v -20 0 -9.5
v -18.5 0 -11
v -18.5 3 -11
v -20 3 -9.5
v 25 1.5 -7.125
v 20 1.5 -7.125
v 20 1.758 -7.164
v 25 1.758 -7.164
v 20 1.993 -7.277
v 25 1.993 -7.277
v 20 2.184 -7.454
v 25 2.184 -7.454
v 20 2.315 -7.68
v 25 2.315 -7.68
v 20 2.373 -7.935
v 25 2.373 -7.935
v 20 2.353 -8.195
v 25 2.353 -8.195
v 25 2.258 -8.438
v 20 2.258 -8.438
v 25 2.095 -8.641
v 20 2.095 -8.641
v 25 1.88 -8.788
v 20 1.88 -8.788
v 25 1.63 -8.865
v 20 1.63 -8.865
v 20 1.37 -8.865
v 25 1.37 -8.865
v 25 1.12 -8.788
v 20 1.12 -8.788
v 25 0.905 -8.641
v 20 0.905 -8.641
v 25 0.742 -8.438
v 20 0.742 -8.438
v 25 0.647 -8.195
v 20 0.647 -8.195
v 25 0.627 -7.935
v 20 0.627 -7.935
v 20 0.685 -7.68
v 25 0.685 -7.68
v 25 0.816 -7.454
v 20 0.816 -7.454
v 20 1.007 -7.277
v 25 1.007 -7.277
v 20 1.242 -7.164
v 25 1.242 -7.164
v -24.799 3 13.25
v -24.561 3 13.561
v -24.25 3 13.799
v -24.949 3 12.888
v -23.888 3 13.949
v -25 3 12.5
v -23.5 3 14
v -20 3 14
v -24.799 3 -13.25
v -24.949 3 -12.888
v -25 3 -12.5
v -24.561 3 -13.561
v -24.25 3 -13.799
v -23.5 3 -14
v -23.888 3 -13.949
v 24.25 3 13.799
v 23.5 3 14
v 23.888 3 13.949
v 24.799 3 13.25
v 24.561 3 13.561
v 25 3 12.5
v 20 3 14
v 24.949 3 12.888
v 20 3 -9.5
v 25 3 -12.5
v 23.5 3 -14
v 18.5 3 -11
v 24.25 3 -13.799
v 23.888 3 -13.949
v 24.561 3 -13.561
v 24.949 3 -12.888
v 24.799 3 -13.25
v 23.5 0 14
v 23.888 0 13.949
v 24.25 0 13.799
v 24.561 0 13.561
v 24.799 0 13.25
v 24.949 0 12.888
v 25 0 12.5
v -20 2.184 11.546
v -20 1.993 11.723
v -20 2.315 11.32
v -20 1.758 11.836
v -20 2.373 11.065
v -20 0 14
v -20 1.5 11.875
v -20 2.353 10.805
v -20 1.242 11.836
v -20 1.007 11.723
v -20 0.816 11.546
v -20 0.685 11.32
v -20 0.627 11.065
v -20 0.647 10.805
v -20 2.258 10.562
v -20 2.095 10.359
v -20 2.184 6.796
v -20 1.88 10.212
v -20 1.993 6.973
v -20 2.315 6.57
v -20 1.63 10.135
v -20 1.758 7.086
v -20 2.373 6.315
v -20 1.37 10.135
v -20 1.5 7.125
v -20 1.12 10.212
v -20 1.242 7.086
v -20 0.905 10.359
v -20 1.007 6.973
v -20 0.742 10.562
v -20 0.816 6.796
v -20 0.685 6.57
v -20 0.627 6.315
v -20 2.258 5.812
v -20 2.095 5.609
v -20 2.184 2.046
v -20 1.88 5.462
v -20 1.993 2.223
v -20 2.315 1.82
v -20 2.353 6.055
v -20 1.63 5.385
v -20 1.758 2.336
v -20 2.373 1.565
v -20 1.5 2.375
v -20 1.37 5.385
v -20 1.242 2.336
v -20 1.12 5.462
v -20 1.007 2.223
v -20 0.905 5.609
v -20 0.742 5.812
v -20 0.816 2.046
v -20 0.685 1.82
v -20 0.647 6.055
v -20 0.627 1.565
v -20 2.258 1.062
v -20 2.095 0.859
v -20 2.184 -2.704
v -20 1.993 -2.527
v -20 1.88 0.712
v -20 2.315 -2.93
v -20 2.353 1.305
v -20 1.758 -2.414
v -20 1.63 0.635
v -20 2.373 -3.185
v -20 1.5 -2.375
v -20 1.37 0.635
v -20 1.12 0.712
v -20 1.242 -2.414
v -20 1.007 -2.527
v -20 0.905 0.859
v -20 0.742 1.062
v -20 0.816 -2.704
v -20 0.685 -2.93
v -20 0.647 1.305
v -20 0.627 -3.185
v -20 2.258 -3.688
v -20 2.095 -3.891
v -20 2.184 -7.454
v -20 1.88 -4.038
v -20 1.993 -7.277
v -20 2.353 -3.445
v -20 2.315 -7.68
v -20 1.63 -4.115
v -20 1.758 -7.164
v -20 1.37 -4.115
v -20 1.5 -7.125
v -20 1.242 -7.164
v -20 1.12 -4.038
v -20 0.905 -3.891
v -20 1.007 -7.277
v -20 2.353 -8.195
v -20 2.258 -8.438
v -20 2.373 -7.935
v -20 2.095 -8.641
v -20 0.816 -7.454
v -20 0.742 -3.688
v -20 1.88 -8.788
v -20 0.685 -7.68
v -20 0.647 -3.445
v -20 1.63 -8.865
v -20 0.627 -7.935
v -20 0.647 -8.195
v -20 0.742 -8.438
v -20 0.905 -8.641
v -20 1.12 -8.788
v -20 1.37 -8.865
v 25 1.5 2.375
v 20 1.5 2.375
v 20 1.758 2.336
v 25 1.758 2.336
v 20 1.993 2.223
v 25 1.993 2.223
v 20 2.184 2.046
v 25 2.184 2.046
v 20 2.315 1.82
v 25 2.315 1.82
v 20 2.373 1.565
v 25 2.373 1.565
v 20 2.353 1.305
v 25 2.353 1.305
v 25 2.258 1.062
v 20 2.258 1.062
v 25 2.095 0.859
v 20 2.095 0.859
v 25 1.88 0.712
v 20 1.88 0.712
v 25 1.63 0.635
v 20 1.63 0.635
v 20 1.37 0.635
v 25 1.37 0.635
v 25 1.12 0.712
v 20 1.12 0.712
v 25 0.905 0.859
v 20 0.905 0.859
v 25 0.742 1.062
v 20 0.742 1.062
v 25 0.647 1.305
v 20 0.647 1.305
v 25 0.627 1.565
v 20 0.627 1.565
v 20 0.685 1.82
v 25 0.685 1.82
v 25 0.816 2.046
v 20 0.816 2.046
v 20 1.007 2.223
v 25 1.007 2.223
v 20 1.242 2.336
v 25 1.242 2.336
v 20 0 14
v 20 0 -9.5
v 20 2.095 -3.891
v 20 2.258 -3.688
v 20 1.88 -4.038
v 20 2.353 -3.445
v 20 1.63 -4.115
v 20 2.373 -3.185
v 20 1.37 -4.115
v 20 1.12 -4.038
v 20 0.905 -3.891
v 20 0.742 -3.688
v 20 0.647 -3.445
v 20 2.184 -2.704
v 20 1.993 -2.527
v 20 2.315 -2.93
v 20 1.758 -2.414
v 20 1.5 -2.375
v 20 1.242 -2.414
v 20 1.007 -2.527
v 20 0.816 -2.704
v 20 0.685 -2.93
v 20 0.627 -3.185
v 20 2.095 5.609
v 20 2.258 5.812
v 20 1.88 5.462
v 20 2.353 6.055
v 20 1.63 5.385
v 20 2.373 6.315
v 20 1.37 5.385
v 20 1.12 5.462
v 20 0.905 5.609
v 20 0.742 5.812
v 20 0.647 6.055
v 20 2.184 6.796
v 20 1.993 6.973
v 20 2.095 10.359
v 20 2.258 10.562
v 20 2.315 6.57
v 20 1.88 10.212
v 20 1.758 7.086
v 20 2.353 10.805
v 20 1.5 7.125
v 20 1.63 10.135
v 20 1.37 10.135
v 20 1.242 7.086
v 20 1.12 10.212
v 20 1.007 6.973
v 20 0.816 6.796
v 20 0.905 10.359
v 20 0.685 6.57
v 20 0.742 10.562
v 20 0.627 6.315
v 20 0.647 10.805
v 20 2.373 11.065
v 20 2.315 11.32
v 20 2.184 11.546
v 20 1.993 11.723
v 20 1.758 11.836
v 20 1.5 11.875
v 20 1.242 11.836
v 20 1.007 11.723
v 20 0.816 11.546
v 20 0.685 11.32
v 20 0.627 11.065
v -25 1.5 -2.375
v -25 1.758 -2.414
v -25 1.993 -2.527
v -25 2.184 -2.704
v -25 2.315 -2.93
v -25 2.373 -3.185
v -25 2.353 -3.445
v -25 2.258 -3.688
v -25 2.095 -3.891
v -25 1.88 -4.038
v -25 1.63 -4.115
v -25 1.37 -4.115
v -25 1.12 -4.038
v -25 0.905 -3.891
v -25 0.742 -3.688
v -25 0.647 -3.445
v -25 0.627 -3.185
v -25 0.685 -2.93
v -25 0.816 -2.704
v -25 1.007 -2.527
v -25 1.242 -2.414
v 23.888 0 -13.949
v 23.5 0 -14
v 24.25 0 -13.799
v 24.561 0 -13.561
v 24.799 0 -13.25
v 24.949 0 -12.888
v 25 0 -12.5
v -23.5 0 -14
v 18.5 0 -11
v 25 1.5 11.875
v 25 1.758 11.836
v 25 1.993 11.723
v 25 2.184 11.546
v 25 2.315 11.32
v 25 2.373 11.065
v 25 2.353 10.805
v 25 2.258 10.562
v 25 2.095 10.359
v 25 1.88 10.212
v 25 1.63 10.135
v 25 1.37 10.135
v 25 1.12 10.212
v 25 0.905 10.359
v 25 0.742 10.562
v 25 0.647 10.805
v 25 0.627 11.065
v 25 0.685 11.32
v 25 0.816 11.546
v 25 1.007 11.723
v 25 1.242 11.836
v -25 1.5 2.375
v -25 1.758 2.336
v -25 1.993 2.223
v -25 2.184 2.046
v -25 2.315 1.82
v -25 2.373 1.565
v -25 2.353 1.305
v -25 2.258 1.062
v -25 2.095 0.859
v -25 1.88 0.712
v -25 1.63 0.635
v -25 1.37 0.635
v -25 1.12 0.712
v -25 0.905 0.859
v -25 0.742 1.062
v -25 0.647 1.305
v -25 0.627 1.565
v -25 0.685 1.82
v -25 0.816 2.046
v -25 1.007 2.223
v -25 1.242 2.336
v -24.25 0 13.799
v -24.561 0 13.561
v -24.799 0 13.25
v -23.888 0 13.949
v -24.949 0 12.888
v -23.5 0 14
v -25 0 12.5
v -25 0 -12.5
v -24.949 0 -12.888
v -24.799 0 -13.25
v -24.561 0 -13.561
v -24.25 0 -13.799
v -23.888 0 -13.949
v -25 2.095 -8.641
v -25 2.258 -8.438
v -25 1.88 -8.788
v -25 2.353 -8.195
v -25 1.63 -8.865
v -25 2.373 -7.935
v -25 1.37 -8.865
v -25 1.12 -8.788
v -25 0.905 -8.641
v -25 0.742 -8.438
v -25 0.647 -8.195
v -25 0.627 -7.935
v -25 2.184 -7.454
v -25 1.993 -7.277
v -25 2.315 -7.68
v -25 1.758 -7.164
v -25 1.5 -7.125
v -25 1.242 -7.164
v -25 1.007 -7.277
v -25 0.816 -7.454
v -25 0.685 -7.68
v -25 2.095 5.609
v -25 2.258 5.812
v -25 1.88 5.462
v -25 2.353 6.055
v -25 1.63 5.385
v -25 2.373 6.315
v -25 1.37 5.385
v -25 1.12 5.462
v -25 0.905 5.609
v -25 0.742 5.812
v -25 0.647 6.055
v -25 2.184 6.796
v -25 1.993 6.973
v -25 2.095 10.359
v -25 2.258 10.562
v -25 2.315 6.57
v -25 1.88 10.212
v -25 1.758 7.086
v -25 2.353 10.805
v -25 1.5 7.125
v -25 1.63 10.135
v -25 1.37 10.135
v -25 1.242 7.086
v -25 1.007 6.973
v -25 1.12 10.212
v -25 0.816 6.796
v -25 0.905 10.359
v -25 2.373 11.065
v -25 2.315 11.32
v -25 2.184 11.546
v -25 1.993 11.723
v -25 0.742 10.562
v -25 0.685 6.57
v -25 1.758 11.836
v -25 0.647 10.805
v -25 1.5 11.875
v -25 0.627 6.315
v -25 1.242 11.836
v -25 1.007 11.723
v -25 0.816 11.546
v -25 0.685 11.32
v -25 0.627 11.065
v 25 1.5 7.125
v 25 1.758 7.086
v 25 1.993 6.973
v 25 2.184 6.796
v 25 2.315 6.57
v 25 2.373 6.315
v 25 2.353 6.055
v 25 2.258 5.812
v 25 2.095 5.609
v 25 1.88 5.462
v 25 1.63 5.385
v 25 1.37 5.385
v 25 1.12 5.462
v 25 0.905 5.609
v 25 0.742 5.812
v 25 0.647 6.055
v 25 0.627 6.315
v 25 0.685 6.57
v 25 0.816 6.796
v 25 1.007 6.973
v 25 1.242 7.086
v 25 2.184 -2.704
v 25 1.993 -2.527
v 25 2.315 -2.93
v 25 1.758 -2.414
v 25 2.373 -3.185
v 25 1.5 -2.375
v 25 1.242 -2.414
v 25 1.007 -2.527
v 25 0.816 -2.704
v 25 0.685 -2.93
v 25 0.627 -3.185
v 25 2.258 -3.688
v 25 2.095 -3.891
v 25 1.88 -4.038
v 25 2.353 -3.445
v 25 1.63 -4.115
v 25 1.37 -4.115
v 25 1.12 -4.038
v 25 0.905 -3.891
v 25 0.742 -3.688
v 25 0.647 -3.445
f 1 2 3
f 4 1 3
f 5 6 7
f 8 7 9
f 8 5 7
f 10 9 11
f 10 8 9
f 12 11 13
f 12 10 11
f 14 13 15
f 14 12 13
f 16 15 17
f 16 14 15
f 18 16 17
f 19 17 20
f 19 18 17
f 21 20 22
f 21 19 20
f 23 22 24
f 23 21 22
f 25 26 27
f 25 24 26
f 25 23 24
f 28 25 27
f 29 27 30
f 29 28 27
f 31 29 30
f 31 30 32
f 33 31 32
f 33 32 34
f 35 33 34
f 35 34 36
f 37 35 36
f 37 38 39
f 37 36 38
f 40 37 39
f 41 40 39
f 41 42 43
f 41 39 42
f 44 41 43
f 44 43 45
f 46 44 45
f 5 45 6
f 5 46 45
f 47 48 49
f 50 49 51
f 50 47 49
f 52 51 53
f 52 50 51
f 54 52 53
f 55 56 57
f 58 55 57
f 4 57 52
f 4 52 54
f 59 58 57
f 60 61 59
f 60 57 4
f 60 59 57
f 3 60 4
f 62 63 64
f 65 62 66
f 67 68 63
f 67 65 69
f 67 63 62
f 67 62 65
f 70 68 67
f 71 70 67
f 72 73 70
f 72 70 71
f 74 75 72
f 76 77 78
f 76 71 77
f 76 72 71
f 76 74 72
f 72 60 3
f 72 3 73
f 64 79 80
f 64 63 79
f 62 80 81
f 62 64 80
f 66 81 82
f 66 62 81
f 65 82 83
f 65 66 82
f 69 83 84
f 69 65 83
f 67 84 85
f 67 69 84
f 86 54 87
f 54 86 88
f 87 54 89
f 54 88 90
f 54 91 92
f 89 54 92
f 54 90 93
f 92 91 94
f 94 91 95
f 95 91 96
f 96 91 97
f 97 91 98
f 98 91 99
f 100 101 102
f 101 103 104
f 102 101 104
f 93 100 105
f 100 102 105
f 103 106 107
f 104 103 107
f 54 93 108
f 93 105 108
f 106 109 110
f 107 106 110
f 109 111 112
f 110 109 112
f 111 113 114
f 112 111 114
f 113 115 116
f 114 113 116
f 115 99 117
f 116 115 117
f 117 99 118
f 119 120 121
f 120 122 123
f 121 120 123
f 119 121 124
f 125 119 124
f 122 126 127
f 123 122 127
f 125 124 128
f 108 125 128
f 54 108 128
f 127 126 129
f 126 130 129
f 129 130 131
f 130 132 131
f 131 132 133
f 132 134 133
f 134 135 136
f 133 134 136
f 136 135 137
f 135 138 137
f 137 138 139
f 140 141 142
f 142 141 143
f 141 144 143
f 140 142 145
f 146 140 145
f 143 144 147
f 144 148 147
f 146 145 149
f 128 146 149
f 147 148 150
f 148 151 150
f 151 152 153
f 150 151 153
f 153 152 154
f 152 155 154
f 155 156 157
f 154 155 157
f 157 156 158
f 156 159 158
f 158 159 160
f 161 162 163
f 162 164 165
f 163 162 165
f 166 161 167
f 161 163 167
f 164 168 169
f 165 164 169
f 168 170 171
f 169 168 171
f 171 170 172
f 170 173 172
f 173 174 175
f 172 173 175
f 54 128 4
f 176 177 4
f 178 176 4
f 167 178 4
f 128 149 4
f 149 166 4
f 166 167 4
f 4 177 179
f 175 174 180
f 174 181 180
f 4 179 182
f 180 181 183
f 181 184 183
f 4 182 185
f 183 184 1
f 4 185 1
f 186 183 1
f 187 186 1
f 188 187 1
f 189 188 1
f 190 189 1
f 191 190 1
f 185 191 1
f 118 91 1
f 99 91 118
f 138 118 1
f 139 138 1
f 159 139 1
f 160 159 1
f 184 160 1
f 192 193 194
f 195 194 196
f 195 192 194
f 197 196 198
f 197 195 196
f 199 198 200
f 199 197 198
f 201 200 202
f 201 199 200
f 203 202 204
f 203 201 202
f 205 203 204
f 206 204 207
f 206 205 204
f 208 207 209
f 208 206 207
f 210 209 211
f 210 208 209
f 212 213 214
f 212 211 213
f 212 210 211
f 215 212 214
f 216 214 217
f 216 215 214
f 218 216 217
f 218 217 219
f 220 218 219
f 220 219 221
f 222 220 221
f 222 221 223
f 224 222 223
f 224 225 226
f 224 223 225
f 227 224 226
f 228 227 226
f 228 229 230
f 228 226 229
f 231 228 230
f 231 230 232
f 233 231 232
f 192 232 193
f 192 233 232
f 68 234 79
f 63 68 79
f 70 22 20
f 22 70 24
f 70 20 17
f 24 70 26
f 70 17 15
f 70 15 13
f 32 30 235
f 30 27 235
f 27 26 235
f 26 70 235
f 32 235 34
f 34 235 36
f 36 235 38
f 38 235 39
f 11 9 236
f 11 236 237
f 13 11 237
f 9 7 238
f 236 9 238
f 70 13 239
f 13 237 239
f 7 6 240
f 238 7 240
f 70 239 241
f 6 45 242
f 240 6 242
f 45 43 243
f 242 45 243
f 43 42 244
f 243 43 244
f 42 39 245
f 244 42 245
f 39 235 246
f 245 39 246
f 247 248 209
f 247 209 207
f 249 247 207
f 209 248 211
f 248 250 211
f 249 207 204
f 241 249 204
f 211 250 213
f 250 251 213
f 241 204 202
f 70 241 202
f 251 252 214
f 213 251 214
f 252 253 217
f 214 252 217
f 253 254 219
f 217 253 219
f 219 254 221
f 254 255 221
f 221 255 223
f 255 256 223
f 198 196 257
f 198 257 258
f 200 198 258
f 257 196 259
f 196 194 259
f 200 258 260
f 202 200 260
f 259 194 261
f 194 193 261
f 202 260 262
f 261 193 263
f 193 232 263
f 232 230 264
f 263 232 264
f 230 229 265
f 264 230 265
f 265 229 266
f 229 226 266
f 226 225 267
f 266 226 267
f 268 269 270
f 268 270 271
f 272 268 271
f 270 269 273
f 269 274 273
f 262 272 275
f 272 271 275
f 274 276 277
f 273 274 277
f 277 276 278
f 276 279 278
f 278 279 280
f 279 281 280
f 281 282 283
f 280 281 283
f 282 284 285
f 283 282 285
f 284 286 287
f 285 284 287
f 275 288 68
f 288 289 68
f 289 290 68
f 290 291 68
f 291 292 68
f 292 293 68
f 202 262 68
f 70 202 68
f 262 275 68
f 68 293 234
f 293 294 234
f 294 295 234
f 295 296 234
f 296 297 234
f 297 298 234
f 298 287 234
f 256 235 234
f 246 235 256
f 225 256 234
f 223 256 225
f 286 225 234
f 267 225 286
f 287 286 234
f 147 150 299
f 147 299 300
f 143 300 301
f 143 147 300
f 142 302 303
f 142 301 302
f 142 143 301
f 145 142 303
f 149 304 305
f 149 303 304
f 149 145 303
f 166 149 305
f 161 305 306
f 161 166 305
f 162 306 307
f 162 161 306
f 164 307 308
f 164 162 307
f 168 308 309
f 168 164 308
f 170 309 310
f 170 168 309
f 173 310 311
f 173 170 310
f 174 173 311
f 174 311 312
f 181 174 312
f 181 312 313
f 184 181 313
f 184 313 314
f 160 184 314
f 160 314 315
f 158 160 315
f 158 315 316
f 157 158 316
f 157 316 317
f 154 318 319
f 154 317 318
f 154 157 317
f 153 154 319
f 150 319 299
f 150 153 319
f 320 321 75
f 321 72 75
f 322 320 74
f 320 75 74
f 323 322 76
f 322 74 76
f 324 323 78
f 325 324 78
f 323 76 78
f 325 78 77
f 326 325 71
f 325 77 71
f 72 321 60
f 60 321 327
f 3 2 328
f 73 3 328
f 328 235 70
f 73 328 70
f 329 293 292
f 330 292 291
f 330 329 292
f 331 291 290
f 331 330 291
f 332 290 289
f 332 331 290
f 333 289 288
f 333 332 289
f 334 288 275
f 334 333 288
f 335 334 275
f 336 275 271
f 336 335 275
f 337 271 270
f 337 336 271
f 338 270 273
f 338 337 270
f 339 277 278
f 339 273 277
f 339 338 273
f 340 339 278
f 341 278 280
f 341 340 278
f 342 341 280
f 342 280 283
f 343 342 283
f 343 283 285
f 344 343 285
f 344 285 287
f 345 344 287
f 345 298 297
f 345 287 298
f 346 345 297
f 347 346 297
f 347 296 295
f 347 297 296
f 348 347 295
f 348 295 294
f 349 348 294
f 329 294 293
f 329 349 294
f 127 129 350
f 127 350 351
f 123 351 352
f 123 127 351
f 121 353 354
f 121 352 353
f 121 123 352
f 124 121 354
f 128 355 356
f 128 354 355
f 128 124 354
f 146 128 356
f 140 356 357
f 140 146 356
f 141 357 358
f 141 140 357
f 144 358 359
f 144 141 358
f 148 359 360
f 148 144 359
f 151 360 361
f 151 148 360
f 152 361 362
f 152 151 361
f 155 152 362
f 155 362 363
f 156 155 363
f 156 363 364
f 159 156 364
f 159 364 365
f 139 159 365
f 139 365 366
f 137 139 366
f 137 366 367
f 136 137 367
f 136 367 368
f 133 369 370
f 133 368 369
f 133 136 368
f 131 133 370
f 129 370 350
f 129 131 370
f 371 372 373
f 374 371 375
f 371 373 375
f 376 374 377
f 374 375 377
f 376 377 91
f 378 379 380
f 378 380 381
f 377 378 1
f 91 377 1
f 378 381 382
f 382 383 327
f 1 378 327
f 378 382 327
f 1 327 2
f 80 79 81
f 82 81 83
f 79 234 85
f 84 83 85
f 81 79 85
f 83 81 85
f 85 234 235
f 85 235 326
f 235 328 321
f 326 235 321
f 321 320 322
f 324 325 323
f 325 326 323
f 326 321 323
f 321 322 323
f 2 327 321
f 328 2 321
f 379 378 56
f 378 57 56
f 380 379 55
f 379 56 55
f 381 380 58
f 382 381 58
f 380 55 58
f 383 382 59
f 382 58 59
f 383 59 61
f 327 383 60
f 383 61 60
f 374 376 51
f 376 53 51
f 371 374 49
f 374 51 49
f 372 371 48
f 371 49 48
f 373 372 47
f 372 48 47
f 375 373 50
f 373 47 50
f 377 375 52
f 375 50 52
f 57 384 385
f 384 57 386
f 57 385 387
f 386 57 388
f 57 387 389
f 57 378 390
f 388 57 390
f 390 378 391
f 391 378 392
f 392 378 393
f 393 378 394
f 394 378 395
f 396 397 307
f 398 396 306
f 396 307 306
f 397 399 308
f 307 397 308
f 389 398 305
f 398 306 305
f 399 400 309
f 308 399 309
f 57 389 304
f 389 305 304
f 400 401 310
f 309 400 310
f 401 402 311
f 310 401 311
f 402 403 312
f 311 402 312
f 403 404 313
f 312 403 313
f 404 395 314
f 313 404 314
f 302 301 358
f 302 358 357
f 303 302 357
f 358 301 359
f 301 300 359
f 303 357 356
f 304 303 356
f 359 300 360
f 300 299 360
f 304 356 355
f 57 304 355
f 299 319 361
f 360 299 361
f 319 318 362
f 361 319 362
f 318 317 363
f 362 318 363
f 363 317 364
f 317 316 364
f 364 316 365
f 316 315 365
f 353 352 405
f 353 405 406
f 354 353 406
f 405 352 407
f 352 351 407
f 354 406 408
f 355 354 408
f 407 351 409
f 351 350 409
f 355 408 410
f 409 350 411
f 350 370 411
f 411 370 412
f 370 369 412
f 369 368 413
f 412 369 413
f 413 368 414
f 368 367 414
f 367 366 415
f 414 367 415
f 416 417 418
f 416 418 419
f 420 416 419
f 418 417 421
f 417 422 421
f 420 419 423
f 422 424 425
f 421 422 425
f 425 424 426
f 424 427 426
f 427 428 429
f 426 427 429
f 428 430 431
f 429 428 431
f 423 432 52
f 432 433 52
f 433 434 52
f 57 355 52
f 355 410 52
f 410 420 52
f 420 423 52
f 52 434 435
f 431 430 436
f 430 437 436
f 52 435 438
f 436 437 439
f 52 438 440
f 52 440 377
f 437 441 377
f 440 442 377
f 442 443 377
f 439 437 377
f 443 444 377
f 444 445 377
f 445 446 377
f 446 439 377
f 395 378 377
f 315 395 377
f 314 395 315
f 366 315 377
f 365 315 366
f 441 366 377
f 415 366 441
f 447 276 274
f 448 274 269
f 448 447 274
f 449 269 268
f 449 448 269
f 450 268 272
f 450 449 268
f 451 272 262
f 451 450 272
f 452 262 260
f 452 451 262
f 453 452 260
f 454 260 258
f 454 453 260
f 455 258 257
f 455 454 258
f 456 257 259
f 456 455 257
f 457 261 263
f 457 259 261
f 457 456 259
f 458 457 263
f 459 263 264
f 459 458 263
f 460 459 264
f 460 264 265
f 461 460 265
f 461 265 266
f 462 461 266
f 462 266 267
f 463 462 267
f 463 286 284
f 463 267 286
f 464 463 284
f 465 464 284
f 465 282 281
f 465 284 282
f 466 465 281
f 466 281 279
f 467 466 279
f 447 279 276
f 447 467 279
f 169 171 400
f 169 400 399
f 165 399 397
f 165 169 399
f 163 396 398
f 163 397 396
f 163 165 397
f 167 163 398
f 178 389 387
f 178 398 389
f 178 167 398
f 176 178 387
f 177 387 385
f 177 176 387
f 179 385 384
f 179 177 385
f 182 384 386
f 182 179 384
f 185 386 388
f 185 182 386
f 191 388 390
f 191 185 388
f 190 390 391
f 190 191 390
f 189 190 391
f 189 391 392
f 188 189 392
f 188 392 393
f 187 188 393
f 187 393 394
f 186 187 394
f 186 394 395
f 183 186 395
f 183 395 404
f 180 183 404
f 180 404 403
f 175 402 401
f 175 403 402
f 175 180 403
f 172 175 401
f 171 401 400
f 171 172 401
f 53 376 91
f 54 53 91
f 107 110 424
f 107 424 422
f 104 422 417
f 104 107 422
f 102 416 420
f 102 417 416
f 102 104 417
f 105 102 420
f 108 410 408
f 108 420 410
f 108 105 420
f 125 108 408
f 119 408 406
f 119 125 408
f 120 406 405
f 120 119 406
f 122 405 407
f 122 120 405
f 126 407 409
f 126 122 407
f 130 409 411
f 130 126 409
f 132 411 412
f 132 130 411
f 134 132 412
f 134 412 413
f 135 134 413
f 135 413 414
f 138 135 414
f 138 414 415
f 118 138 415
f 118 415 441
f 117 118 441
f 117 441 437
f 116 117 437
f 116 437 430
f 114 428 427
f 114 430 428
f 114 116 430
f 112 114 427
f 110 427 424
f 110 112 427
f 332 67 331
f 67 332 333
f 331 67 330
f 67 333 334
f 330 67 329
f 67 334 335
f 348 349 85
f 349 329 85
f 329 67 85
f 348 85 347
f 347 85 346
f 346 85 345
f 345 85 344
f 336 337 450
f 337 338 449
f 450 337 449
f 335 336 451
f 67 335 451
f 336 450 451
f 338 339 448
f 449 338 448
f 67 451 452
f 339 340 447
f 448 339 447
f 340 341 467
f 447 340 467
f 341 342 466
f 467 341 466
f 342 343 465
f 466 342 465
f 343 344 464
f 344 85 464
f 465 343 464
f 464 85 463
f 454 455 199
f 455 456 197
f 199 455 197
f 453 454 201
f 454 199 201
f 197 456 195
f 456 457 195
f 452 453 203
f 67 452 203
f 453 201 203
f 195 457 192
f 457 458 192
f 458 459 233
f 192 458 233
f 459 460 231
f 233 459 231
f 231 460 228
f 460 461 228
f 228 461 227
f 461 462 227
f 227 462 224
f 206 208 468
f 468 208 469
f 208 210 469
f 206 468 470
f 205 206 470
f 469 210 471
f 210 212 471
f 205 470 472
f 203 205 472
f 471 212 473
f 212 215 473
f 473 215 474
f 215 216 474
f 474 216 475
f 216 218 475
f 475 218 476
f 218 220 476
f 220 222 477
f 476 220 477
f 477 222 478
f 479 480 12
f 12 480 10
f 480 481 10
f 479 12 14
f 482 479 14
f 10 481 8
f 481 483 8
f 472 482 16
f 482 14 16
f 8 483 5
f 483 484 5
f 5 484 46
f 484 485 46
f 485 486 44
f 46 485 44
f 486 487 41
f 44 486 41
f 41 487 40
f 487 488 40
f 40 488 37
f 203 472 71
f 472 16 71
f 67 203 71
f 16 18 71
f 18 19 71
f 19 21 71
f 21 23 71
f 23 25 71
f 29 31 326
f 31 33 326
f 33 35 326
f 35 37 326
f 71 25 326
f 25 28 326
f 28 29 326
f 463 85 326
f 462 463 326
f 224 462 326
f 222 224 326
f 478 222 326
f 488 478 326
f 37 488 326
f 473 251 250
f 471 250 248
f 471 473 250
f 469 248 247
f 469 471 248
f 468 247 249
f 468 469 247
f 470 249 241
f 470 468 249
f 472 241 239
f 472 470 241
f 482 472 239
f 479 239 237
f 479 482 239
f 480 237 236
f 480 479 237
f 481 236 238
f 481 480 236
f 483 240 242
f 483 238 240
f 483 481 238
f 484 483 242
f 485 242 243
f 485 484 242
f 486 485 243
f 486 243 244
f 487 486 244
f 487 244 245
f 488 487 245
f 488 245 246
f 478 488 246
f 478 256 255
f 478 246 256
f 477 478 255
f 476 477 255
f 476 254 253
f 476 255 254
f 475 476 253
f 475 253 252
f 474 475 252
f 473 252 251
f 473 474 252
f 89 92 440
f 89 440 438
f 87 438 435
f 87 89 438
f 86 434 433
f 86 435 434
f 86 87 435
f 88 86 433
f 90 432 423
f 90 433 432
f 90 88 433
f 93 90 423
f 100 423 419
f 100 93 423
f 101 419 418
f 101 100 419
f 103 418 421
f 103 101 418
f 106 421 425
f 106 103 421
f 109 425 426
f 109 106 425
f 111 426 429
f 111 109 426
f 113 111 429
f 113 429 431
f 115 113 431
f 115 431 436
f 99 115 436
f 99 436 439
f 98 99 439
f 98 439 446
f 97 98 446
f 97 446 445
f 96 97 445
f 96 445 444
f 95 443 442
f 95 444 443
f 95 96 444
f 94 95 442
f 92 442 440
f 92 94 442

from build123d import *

# Parameters (mm, degrees)
BOSS_EXTRUDE1_DEPTH     = 3
SKETCH2_R               = 0.875
CUT_EXTRUDE1_DEPTH      = 51
CUT_EXTRUDE1_DEPTH_BACK = 3
FILLET2_R               = 1.5
CHAMFER1_SIZE           = 1.5


with BuildPart() as part:
    # Sketch1 → Boss-Extrude1 (new body)
    with BuildSketch(Plane(origin=(0, 0, 0), x_dir=(1, 0, 0), z_dir=(0, 1, 0))):
        Polygon((-25, -14), (-20, -14), (-20, 11), (20, 11), (20, -14), (25, -14), (25, 14), (-25, 14), align=None)
    extrude(amount=BOSS_EXTRUDE1_DEPTH)

    # Sketch2 → Cut-Extrude1 (cut, two sides)
    with BuildSketch(Plane.ZY.offset(-25)) as cut_extrude1_sk:
        with Locations((11, 1.5)):
            Circle(SKETCH2_R)
        with Locations((6.25, 1.5)):
            Circle(SKETCH2_R)
        with Locations((1.5, 1.5)):
            Circle(SKETCH2_R)
        with Locations((-3.25, 1.5)):
            Circle(SKETCH2_R)
        with Locations((-8, 1.5)):
            Circle(SKETCH2_R)
    extrude(amount=CUT_EXTRUDE1_DEPTH, mode=Mode.SUBTRACT)
    extrude(cut_extrude1_sk.sketch, amount=-CUT_EXTRUDE1_DEPTH_BACK, mode=Mode.SUBTRACT)

    # Fillet2
    fillet2_edges = [part.edges().sort_by_distance(p)[0] for p in [
        (25, 1.5, 14),
        (-25, 1.5, 14),
        (-25, 1.5, -14),
        (25, 1.5, -14),
    ]]
    fillet(fillet2_edges, radius=FILLET2_R)

    # Chamfer1
    chamfer1_edges = [part.edges().sort_by_distance(p)[0] for p in [
        (20, 1.5, -11),
        (-20, 1.5, -11),
    ]]
    chamfer(chamfer1_edges, length=CHAMFER1_SIZE)


solid = part.part
